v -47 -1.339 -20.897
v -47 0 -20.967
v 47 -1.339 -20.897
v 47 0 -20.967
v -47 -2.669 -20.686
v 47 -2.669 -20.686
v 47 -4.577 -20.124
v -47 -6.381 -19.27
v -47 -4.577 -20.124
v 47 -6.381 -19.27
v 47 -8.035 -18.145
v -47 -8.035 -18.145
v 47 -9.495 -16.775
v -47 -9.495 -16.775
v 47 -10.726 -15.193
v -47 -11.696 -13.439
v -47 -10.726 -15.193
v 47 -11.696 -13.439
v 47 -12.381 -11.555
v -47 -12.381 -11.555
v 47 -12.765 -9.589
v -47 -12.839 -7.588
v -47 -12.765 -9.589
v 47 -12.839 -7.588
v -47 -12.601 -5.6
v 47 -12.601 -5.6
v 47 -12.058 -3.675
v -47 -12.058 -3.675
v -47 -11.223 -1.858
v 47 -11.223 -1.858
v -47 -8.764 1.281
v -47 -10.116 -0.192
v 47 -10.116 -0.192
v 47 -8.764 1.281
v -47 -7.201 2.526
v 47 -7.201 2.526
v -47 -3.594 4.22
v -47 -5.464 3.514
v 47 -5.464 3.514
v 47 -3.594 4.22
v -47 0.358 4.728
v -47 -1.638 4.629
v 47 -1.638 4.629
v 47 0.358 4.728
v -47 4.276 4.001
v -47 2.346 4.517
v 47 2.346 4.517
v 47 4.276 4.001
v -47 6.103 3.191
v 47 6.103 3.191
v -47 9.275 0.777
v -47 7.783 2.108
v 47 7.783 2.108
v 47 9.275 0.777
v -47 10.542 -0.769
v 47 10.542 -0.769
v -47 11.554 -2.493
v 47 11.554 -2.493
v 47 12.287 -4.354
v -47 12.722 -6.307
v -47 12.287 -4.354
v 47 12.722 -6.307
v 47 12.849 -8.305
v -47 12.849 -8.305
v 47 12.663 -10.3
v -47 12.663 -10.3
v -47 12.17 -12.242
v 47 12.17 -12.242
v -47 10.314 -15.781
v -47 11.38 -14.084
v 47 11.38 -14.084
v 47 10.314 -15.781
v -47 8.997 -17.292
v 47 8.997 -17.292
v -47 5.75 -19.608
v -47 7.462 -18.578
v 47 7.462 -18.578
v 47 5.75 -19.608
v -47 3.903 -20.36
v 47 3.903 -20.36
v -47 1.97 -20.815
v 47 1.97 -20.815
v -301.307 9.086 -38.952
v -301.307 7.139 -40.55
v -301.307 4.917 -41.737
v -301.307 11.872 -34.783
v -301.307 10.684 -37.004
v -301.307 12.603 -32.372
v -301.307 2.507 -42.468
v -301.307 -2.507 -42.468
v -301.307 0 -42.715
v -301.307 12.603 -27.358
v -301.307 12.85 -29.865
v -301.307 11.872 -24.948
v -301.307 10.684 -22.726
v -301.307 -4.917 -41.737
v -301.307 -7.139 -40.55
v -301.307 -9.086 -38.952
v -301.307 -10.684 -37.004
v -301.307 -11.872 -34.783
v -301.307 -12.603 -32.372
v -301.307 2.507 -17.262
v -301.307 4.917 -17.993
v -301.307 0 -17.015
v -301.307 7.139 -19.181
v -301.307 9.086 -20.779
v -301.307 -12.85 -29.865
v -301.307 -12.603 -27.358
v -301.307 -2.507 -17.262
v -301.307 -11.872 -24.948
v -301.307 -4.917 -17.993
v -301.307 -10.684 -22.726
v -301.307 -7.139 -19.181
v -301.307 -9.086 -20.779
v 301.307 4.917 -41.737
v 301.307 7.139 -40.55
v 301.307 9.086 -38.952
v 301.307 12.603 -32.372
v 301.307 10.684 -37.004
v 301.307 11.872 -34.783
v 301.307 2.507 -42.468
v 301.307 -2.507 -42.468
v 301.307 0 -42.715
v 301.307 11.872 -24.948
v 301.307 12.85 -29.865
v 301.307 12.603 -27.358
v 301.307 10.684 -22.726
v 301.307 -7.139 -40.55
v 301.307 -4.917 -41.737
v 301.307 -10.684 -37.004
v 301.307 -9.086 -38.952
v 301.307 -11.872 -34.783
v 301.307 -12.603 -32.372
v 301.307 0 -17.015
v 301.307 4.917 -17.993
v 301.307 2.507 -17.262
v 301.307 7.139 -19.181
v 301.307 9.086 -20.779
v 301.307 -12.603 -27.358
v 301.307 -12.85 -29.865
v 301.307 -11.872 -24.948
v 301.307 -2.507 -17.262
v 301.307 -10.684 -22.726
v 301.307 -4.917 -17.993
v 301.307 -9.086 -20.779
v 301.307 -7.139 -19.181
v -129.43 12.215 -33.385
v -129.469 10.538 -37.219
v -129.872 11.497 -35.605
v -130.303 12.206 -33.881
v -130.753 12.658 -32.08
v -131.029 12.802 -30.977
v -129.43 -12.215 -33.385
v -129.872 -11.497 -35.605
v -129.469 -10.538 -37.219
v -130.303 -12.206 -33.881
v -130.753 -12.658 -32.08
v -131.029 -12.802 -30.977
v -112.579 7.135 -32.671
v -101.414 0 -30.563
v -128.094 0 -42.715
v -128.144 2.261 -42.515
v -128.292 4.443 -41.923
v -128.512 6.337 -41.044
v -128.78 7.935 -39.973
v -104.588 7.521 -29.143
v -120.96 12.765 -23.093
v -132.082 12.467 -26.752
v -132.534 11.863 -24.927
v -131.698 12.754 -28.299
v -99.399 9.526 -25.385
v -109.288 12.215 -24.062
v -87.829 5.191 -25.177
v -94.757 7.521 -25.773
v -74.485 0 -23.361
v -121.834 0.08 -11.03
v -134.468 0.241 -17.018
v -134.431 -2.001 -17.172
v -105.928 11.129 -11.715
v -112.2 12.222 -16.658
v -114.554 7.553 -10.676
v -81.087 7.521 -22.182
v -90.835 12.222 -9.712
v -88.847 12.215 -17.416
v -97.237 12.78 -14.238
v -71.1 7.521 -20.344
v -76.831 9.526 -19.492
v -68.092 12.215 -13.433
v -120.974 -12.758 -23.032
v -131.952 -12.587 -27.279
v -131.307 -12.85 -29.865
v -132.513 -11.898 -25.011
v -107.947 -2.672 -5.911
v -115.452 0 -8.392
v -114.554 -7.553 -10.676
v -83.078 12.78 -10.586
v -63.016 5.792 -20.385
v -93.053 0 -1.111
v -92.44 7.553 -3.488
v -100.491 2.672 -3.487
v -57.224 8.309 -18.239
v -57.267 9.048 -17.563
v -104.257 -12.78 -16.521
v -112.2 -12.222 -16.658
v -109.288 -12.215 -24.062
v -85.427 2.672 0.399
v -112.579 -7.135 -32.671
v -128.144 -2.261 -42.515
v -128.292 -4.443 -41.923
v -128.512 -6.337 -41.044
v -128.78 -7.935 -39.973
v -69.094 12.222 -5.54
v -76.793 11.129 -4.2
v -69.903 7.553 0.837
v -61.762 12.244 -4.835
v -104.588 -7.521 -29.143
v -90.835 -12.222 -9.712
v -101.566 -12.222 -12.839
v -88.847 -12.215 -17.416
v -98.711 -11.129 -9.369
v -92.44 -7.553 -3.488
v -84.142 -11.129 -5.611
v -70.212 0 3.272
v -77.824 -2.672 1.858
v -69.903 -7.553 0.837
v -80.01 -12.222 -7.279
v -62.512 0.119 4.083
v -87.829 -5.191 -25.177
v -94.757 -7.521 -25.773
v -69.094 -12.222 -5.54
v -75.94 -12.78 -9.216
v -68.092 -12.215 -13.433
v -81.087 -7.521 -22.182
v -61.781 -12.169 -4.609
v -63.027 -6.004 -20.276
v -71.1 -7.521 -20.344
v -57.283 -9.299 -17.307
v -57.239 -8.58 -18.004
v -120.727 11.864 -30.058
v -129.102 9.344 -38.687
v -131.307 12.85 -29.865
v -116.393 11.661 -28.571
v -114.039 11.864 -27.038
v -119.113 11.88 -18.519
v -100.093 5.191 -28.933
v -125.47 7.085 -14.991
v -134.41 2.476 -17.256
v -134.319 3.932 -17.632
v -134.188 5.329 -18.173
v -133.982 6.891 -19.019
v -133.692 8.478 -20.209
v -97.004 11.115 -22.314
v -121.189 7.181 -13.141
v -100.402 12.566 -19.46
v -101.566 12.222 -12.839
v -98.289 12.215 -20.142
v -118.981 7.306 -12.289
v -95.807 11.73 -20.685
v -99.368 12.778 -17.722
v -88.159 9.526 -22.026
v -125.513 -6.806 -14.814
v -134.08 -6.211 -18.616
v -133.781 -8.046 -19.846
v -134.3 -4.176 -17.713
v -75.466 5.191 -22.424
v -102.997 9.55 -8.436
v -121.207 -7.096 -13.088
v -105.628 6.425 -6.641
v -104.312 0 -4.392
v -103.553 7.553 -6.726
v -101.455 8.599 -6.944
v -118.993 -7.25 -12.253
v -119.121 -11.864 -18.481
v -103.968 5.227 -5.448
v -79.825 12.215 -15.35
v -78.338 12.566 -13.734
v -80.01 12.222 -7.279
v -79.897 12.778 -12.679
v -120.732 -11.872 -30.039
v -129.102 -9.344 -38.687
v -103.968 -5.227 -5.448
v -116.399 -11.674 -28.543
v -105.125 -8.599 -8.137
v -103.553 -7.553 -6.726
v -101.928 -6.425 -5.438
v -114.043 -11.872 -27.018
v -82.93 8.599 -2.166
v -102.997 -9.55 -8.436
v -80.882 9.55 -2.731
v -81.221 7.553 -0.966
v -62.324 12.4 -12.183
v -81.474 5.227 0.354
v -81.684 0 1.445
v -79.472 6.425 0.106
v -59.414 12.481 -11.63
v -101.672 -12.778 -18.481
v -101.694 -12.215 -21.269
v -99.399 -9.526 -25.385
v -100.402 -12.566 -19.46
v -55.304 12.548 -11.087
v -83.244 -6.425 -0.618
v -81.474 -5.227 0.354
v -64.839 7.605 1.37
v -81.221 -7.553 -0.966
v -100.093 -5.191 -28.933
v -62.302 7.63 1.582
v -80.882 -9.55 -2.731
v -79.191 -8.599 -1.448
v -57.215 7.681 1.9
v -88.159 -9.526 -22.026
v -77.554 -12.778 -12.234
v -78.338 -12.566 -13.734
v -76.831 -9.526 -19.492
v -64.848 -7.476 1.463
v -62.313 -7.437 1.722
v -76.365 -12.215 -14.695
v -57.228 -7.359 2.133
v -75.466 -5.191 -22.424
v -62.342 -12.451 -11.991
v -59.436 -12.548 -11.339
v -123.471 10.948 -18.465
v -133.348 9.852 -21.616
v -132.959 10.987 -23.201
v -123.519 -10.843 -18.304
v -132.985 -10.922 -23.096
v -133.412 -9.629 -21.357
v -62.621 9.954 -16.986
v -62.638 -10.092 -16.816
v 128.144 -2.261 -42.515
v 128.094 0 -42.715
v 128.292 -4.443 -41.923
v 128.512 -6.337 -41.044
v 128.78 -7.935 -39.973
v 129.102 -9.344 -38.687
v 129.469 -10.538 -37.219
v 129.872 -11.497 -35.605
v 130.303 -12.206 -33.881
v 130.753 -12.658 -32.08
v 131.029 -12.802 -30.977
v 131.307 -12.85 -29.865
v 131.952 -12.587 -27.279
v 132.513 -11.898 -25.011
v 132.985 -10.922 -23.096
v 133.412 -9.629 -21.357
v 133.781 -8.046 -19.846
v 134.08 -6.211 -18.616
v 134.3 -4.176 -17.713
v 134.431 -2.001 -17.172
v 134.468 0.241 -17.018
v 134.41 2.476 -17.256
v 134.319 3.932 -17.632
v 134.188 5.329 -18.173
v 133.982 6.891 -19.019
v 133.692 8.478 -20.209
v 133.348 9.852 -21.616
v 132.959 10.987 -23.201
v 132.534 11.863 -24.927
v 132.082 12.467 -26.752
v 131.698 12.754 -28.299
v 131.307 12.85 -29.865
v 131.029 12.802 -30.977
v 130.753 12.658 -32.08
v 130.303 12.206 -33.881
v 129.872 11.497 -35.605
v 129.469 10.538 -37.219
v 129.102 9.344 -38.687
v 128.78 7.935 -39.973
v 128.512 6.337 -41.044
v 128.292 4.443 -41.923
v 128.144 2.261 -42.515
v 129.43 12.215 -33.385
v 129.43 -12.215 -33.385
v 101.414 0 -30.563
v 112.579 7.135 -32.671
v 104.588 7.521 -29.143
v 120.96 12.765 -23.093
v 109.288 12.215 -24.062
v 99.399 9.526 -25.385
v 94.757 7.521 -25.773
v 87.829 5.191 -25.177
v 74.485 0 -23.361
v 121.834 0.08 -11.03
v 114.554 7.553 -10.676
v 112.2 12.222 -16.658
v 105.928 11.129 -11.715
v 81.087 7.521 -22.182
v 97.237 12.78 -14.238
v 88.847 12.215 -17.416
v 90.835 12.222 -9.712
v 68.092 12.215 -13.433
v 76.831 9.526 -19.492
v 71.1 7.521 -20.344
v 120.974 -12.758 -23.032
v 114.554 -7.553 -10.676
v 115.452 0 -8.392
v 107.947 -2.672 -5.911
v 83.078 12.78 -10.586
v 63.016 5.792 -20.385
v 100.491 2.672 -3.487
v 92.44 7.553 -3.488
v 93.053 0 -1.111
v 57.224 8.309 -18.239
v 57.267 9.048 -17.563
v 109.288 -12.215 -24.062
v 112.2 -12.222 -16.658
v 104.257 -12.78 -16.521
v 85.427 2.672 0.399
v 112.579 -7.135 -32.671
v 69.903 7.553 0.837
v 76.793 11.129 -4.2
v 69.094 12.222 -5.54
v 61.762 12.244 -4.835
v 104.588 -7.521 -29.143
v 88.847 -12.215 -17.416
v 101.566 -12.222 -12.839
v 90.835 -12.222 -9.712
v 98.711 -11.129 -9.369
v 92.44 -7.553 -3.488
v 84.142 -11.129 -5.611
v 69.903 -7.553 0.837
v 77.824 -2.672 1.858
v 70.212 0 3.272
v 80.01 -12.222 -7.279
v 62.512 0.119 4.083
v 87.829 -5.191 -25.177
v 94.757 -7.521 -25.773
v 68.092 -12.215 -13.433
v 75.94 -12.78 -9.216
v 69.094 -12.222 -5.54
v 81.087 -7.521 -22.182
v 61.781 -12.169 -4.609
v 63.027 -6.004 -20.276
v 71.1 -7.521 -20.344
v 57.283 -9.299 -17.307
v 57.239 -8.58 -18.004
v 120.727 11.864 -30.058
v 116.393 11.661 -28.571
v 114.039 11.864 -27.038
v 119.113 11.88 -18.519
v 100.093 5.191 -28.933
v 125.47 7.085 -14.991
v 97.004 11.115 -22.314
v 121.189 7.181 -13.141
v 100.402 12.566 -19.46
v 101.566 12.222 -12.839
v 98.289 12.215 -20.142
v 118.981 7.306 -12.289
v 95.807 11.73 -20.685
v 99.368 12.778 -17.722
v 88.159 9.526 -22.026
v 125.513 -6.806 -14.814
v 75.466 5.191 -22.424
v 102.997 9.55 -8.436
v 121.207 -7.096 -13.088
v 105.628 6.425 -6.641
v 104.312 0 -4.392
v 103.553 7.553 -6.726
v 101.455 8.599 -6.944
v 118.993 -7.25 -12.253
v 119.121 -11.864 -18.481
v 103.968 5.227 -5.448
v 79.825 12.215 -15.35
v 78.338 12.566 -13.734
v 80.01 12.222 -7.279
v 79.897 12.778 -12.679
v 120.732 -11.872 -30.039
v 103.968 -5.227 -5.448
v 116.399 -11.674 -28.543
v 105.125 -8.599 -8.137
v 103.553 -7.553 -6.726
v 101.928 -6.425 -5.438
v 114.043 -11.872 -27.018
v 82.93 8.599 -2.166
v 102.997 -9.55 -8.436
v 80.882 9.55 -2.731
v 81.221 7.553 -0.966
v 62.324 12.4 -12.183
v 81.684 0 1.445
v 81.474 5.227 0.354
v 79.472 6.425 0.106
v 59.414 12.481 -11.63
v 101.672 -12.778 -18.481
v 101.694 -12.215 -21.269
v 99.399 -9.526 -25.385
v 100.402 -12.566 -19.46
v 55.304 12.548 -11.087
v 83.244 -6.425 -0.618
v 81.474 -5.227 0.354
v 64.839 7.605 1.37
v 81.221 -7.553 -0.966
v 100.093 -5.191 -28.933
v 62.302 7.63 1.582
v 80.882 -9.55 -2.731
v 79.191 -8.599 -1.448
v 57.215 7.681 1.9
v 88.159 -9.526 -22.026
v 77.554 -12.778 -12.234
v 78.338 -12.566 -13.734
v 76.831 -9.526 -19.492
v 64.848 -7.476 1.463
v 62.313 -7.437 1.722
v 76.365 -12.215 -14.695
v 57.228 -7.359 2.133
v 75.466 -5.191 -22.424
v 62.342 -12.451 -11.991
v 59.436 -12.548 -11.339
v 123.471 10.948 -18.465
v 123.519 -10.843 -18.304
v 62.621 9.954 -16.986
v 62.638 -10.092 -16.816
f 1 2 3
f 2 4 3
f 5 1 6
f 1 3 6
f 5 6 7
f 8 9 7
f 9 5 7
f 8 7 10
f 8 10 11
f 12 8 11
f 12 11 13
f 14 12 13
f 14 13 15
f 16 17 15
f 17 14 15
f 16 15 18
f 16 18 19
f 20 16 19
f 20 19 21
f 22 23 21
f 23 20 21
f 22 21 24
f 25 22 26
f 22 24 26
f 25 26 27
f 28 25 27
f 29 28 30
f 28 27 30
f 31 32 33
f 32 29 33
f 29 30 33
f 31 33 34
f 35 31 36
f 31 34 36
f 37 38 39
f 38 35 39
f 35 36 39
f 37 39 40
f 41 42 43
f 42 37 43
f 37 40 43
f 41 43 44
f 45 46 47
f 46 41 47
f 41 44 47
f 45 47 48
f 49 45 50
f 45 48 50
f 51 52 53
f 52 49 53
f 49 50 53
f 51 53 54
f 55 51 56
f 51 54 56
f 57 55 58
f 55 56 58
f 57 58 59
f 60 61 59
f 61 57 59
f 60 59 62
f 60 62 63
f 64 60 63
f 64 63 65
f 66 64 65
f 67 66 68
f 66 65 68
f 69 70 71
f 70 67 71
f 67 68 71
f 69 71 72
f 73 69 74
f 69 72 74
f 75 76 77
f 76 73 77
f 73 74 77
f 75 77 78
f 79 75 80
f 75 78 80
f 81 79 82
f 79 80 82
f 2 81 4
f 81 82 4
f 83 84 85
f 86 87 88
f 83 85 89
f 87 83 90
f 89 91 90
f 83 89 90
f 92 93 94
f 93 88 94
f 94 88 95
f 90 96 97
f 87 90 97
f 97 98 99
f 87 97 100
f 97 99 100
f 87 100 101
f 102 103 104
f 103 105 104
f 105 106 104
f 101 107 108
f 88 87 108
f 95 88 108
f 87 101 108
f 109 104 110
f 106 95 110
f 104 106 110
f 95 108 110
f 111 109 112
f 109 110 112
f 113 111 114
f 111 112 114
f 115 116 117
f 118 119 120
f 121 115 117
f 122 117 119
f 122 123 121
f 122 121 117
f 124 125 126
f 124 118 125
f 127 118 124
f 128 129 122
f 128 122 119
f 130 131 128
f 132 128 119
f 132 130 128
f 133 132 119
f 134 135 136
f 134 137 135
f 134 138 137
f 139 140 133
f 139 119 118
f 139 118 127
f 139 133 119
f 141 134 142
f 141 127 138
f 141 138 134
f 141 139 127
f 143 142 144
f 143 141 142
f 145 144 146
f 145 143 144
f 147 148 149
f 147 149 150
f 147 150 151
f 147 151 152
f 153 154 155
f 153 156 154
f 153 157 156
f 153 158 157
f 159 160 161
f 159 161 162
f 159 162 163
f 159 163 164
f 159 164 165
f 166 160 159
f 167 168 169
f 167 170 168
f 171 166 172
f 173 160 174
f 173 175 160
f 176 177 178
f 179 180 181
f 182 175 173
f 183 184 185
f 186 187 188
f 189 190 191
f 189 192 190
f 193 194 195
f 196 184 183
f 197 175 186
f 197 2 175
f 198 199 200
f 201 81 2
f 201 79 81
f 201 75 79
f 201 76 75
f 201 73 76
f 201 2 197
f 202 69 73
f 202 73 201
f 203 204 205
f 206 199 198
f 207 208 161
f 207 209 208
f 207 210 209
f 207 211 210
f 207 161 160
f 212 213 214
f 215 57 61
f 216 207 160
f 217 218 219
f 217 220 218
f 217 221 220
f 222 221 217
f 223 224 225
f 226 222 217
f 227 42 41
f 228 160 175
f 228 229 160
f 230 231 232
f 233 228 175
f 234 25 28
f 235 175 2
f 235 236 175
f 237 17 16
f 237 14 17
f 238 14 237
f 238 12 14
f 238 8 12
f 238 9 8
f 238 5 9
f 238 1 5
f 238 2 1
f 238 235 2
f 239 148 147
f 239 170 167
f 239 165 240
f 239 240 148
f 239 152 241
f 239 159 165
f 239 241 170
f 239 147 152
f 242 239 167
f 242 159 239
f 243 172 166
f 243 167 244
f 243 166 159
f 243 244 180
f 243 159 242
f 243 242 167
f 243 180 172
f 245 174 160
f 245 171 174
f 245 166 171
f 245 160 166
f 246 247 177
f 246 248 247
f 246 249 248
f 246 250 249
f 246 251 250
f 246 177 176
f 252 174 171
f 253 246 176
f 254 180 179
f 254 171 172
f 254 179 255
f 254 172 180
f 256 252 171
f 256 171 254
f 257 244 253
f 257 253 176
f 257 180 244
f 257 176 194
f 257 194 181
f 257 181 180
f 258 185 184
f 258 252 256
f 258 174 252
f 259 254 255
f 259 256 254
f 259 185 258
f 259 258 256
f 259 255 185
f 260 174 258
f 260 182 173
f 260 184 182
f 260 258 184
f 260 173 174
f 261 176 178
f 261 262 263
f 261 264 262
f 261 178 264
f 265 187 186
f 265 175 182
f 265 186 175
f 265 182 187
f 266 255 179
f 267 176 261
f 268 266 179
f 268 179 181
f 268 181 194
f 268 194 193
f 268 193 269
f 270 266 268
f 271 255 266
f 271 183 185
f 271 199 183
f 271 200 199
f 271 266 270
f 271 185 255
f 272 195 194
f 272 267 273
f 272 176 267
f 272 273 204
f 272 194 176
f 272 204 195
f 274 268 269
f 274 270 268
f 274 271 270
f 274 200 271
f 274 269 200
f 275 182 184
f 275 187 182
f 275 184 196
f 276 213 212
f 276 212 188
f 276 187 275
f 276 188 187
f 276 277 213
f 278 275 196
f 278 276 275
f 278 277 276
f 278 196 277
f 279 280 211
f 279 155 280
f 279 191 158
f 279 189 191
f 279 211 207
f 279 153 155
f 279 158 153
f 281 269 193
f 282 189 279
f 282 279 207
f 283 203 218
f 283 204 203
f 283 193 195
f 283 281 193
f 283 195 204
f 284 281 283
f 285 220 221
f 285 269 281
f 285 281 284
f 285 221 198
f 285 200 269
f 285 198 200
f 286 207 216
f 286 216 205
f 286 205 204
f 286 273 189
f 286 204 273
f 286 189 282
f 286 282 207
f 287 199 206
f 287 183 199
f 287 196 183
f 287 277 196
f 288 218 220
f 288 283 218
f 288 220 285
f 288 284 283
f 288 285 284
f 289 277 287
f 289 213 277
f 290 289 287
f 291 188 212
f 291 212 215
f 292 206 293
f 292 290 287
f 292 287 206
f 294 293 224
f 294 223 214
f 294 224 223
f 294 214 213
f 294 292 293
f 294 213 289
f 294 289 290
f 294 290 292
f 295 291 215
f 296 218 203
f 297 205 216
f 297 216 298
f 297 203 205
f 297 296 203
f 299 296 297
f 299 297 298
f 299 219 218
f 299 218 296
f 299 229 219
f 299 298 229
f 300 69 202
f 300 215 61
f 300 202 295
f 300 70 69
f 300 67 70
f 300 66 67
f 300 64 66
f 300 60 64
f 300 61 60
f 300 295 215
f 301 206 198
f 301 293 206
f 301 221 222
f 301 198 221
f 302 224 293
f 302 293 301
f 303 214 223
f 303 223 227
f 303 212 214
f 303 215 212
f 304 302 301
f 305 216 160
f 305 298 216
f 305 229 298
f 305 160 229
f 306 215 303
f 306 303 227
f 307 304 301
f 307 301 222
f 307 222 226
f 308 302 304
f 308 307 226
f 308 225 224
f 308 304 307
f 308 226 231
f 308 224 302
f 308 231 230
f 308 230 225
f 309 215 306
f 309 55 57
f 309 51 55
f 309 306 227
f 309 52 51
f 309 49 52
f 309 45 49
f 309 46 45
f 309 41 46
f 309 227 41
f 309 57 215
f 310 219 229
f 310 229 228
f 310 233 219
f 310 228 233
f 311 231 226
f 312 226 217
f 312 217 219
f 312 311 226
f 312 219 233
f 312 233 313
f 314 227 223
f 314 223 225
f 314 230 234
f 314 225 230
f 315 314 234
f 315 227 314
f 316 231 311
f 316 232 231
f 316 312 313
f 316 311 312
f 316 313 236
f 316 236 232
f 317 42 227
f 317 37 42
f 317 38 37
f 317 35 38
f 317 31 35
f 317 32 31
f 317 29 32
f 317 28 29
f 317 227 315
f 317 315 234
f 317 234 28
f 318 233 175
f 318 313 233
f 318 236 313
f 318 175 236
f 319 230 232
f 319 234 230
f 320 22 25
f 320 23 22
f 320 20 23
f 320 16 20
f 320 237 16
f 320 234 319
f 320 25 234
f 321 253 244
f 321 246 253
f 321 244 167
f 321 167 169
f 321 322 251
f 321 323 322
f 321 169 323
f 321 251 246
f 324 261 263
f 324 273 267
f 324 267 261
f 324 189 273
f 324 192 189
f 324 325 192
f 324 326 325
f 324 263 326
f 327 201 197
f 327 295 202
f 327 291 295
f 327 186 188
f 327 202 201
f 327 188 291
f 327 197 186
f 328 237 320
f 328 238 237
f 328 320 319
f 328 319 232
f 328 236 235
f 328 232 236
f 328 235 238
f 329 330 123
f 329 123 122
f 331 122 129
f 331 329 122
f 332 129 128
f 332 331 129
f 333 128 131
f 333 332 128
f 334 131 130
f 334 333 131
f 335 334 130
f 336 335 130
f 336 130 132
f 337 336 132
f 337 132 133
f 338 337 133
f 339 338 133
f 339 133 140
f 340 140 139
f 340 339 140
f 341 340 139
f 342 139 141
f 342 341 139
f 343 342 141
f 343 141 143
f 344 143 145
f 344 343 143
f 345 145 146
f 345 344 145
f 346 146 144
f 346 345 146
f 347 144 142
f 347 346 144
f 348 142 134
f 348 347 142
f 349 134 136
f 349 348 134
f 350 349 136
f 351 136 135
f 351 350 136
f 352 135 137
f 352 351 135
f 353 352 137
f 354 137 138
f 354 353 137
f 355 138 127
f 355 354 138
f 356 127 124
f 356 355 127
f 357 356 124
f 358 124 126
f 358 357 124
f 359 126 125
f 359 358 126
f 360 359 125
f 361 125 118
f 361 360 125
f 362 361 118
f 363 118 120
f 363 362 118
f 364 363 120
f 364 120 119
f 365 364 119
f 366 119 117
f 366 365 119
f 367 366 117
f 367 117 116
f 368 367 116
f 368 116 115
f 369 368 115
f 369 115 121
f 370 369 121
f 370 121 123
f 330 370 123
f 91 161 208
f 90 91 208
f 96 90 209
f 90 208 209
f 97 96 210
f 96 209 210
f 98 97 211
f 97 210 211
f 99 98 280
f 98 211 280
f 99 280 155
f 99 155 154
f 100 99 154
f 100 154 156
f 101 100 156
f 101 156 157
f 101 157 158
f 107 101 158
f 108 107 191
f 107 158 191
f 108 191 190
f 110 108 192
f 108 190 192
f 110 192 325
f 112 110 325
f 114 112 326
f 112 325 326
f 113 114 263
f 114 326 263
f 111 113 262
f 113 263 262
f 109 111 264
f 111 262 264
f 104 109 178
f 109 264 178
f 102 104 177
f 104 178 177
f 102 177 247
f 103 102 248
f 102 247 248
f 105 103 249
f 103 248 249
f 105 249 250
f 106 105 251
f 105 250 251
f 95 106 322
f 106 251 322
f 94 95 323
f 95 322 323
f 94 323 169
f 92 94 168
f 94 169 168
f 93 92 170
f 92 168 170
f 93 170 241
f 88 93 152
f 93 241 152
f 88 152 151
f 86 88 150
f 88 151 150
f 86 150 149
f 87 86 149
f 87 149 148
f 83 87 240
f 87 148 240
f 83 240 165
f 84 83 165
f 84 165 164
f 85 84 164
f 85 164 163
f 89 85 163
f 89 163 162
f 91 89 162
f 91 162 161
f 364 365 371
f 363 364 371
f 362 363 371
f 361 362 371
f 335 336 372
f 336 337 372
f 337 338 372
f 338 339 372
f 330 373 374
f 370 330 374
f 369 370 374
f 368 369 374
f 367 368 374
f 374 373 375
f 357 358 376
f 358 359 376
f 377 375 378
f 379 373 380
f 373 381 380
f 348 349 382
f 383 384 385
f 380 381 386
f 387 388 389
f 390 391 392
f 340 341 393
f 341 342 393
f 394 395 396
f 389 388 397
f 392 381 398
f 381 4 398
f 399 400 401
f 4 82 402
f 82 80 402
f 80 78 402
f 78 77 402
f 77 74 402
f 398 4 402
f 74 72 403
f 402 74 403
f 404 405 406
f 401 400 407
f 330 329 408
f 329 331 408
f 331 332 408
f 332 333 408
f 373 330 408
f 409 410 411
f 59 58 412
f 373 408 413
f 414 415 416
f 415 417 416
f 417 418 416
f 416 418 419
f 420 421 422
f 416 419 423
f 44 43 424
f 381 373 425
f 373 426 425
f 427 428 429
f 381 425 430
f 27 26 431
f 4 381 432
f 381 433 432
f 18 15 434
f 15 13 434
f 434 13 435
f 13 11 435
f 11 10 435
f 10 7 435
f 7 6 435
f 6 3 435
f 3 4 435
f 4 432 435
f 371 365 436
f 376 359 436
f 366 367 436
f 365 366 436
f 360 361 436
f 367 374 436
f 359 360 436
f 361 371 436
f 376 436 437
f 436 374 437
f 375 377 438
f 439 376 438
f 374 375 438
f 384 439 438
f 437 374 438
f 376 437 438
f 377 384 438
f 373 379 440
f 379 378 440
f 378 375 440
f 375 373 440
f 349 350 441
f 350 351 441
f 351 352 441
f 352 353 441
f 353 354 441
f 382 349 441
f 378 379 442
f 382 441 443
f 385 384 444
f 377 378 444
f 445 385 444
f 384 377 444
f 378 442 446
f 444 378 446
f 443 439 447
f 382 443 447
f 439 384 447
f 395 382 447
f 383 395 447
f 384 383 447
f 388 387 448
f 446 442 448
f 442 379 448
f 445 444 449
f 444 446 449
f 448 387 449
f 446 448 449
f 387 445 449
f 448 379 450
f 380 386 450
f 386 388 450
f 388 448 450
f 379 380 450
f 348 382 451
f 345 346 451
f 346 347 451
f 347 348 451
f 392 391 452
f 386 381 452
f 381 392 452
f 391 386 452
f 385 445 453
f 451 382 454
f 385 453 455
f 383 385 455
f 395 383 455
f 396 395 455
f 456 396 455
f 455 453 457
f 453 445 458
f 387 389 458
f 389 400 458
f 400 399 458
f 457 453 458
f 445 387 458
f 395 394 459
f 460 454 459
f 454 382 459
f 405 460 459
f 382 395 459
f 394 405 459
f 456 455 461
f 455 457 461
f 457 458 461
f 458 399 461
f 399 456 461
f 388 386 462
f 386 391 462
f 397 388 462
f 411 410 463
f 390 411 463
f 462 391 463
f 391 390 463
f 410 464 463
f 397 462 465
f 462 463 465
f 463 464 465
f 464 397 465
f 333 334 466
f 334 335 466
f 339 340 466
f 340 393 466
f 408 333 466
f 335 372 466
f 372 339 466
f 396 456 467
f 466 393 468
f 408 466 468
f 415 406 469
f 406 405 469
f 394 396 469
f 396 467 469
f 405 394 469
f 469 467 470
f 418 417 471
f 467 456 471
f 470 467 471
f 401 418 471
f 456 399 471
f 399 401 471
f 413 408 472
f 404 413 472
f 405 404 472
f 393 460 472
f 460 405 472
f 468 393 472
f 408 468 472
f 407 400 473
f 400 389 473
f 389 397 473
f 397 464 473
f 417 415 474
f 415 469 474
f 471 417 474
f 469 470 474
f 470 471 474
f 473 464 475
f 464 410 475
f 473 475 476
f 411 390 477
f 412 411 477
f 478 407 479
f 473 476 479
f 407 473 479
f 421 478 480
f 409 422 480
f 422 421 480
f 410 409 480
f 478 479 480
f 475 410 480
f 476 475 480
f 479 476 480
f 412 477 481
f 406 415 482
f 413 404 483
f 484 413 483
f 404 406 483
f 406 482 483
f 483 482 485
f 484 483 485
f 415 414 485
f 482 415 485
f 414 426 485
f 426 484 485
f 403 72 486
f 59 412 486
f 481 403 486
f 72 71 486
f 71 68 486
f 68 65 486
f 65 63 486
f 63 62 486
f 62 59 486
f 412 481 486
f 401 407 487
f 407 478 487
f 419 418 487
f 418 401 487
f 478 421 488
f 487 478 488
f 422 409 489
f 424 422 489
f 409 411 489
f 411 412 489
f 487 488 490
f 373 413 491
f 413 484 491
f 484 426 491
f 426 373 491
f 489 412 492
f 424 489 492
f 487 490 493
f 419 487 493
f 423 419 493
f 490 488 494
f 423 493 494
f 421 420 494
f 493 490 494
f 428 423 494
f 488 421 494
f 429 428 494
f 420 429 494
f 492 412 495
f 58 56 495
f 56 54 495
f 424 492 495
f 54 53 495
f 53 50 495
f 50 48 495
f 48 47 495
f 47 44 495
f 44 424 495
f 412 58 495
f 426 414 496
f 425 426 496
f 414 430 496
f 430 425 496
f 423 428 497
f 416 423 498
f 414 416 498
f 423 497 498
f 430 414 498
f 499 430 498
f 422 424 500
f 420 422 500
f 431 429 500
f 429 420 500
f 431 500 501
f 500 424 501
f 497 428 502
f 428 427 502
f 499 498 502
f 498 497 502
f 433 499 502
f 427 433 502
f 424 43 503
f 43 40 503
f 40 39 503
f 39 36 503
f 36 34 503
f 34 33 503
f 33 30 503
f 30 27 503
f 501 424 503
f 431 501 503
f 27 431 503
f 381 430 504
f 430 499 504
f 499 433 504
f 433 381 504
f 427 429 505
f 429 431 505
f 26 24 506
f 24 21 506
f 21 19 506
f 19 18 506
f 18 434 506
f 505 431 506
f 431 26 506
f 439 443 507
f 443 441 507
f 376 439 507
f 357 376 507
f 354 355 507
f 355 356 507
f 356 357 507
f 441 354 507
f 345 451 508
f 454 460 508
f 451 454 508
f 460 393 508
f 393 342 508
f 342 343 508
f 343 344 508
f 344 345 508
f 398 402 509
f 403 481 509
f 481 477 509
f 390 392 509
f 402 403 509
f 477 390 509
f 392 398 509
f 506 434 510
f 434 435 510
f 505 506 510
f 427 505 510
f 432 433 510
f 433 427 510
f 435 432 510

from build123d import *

# Parameters (mm, degrees)
SKETCH2_R = 12.85


with BuildPart() as part:
    # Sweep1: sweep along a path in Sketch1
    with BuildLine() as sweep1_path:  # in the path sketch's own coordinates; laid on its plane below (add() does not lay a ready-made edge on the line's plane)
        Line((301.307150881, 29.86530187), (131.307150881, 29.86530187))
        add(Edge.make_bspline(
            [(131.307150881, 29.86530187), (90.533603326, 8.116674685), (47, 8.116674685)],
            knots=[0, 0, 0, 1, 1, 1], degree=2))
        Line((47, 8.116674685), (0, 8.116674685))
    # Sketch2 → Sweep1 (sweep)
    with BuildSketch(Plane(origin=(301.307150881, 0, 0), x_dir=(0, 0, -1), z_dir=(1, 0, 0))):
        with Locations((29.86530187, 0)):
            Circle(SKETCH2_R)
    sweep1 = sweep(path=Plane(origin=(0, 0, 0), x_dir=(1, 0, 0), z_dir=(0, 1, 0)) * sweep1_path.line, transition=Transition.RIGHT)

    # Mirror1: Sweep1 across plane
    add(sweep1.mirror(Plane(origin=(0, 0, 0), x_dir=(0, 0, 1), z_dir=(1, 0, 0))))


solid = part.part
